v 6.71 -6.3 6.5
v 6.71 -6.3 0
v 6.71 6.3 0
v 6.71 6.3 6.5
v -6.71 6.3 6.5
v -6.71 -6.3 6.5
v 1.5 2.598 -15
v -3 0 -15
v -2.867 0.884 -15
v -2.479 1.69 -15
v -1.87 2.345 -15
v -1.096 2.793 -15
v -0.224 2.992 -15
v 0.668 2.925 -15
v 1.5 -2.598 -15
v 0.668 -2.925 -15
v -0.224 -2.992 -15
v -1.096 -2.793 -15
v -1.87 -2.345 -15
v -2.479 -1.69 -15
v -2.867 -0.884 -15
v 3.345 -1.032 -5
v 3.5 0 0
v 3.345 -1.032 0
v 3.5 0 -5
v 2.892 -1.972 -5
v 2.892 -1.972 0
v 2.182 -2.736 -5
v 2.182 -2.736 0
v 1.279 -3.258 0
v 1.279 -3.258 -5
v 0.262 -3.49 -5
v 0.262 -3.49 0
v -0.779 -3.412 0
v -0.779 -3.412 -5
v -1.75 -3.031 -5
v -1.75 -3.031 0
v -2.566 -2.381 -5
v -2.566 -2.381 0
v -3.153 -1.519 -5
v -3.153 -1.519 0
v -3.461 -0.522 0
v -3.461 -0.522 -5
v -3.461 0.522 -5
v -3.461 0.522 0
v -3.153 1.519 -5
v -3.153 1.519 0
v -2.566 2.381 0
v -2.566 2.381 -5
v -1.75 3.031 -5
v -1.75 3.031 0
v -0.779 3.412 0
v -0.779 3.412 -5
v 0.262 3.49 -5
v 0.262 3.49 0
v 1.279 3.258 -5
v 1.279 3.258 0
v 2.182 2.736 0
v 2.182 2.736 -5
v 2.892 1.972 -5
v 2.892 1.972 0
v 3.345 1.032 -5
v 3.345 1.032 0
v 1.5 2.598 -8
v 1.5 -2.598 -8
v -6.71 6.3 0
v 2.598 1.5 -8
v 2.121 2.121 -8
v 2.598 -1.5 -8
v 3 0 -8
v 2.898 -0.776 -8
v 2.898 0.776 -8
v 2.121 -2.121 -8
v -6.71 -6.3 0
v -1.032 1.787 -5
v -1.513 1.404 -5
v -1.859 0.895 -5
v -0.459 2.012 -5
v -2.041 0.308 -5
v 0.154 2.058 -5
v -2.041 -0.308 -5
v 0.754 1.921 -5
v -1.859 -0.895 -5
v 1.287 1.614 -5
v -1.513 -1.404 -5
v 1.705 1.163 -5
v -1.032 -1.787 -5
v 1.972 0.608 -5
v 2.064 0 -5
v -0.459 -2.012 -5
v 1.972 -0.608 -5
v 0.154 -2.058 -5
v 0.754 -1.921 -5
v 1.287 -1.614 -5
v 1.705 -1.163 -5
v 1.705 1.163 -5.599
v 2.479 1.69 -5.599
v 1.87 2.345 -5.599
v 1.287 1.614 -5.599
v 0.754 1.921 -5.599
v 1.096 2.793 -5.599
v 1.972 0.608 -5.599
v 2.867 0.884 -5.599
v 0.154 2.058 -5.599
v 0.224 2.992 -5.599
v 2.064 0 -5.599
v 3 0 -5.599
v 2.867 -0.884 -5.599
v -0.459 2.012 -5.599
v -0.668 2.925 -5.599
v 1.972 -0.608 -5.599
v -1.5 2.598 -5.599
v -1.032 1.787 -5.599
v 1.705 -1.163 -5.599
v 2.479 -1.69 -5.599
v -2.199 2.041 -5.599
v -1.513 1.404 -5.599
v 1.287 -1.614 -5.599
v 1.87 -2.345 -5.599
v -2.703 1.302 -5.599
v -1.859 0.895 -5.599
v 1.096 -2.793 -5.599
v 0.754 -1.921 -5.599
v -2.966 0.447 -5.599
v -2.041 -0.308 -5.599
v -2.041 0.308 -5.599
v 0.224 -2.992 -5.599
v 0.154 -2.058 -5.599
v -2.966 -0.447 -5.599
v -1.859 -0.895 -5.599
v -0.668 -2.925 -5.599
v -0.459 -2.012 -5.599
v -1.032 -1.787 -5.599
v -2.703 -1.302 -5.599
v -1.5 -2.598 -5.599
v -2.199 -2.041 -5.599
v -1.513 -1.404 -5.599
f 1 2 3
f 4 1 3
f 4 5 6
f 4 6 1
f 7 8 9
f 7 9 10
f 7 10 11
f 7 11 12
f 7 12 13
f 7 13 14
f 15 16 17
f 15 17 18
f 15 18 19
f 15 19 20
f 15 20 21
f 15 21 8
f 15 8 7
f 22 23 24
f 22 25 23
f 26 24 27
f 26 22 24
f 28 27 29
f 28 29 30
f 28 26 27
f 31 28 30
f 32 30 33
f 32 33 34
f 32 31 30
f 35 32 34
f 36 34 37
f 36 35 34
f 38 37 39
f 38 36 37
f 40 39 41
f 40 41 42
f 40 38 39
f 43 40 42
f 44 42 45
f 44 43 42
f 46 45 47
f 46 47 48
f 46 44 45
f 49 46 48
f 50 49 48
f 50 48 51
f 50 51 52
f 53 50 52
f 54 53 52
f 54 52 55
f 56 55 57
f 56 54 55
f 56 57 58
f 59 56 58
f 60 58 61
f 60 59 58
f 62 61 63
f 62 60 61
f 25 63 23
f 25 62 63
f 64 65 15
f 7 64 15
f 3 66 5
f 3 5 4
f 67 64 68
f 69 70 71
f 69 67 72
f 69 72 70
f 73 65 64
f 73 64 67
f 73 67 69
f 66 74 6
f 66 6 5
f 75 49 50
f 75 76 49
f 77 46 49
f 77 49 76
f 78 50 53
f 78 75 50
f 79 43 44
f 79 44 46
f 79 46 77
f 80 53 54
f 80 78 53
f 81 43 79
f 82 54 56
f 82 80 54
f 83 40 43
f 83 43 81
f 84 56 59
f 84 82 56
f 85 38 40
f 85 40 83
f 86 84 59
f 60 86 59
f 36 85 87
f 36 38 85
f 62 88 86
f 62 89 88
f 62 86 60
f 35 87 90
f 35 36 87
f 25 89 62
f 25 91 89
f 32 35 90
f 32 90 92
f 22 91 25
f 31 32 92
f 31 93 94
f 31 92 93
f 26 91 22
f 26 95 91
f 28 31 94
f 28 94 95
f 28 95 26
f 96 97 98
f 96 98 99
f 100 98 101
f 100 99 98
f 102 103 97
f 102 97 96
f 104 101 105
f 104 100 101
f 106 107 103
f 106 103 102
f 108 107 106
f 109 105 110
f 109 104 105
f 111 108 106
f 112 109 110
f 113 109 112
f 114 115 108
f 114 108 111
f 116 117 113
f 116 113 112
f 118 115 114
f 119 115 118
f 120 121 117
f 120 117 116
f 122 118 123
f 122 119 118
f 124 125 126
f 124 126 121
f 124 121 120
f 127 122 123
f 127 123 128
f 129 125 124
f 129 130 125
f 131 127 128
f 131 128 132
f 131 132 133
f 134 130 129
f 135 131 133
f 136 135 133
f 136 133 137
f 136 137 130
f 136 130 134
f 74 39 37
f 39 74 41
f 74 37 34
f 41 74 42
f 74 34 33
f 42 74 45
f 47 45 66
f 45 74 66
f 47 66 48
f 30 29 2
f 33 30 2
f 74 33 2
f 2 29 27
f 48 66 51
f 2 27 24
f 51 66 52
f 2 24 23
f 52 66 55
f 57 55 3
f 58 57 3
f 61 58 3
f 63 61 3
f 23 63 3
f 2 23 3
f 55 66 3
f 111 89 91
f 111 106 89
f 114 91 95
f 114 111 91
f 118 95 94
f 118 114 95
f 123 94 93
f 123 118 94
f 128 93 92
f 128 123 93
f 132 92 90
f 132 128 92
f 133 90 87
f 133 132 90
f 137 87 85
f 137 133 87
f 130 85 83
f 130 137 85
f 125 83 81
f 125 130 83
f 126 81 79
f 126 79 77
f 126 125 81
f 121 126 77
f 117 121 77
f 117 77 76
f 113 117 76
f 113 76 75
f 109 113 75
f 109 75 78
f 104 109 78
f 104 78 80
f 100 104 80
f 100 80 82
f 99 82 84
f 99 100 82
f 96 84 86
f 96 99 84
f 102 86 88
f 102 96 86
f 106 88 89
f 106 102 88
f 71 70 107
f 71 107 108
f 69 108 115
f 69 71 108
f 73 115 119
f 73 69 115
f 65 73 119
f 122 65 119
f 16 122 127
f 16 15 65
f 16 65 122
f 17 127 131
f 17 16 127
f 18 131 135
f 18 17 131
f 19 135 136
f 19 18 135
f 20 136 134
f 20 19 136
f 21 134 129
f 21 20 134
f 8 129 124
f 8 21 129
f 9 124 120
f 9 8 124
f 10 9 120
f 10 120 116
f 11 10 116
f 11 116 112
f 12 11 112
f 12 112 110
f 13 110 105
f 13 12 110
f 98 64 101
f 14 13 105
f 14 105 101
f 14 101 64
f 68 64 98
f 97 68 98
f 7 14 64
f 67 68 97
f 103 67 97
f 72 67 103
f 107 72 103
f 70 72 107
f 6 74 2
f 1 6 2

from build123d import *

# Parameters (mm, degrees)
SKETCH1_W               = 13.42
SKETCH1_H               = 12.6
BOSS_EXTRUDE1_DEPTH     = 6.5
CUT_EXTRUDE1_DEPTH      = 18.598695974
CUT_EXTRUDE1_DEPTH_BACK = 18.598695974
SKETCH4_W               = 1.5
SKETCH4_H               = 7


with BuildPart() as part:
    # Sketch1 → Boss-Extrude1 (new body)
    with BuildSketch(Plane.XY):
        Rectangle(SKETCH1_W, SKETCH1_H)
    extrude(amount=BOSS_EXTRUDE1_DEPTH)

    # Sketch3 → Revolve1 (revolve)
    with BuildSketch(Plane(origin=(0, 0, 0), x_dir=(1, 0, 0), z_dir=(0, 1, 0))):
        Polygon((0, 0), (3.5, 0), (3.5, 5), (2.063862247, 5), (2.063862247, 5.599280985), (3, 5.599280985), (3, 15), (0, 15), align=None)
    revolve(axis=Axis((0, 0, 0), (0, 0, -1)))

    # Sketch4 → Cut-Extrude1 (cut, two sides: drawn at the far end of the back side and taken through both)
    with BuildSketch(Plane(origin=(0, 0, 0), x_dir=(1, 0, 0), z_dir=(0, 1, 0)).offset(-CUT_EXTRUDE1_DEPTH_BACK)):
        with Locations((2.25, 11.5)):
            Rectangle(SKETCH4_W, SKETCH4_H)
    extrude(amount=CUT_EXTRUDE1_DEPTH + CUT_EXTRUDE1_DEPTH_BACK, mode=Mode.SUBTRACT)


solid = part.part
